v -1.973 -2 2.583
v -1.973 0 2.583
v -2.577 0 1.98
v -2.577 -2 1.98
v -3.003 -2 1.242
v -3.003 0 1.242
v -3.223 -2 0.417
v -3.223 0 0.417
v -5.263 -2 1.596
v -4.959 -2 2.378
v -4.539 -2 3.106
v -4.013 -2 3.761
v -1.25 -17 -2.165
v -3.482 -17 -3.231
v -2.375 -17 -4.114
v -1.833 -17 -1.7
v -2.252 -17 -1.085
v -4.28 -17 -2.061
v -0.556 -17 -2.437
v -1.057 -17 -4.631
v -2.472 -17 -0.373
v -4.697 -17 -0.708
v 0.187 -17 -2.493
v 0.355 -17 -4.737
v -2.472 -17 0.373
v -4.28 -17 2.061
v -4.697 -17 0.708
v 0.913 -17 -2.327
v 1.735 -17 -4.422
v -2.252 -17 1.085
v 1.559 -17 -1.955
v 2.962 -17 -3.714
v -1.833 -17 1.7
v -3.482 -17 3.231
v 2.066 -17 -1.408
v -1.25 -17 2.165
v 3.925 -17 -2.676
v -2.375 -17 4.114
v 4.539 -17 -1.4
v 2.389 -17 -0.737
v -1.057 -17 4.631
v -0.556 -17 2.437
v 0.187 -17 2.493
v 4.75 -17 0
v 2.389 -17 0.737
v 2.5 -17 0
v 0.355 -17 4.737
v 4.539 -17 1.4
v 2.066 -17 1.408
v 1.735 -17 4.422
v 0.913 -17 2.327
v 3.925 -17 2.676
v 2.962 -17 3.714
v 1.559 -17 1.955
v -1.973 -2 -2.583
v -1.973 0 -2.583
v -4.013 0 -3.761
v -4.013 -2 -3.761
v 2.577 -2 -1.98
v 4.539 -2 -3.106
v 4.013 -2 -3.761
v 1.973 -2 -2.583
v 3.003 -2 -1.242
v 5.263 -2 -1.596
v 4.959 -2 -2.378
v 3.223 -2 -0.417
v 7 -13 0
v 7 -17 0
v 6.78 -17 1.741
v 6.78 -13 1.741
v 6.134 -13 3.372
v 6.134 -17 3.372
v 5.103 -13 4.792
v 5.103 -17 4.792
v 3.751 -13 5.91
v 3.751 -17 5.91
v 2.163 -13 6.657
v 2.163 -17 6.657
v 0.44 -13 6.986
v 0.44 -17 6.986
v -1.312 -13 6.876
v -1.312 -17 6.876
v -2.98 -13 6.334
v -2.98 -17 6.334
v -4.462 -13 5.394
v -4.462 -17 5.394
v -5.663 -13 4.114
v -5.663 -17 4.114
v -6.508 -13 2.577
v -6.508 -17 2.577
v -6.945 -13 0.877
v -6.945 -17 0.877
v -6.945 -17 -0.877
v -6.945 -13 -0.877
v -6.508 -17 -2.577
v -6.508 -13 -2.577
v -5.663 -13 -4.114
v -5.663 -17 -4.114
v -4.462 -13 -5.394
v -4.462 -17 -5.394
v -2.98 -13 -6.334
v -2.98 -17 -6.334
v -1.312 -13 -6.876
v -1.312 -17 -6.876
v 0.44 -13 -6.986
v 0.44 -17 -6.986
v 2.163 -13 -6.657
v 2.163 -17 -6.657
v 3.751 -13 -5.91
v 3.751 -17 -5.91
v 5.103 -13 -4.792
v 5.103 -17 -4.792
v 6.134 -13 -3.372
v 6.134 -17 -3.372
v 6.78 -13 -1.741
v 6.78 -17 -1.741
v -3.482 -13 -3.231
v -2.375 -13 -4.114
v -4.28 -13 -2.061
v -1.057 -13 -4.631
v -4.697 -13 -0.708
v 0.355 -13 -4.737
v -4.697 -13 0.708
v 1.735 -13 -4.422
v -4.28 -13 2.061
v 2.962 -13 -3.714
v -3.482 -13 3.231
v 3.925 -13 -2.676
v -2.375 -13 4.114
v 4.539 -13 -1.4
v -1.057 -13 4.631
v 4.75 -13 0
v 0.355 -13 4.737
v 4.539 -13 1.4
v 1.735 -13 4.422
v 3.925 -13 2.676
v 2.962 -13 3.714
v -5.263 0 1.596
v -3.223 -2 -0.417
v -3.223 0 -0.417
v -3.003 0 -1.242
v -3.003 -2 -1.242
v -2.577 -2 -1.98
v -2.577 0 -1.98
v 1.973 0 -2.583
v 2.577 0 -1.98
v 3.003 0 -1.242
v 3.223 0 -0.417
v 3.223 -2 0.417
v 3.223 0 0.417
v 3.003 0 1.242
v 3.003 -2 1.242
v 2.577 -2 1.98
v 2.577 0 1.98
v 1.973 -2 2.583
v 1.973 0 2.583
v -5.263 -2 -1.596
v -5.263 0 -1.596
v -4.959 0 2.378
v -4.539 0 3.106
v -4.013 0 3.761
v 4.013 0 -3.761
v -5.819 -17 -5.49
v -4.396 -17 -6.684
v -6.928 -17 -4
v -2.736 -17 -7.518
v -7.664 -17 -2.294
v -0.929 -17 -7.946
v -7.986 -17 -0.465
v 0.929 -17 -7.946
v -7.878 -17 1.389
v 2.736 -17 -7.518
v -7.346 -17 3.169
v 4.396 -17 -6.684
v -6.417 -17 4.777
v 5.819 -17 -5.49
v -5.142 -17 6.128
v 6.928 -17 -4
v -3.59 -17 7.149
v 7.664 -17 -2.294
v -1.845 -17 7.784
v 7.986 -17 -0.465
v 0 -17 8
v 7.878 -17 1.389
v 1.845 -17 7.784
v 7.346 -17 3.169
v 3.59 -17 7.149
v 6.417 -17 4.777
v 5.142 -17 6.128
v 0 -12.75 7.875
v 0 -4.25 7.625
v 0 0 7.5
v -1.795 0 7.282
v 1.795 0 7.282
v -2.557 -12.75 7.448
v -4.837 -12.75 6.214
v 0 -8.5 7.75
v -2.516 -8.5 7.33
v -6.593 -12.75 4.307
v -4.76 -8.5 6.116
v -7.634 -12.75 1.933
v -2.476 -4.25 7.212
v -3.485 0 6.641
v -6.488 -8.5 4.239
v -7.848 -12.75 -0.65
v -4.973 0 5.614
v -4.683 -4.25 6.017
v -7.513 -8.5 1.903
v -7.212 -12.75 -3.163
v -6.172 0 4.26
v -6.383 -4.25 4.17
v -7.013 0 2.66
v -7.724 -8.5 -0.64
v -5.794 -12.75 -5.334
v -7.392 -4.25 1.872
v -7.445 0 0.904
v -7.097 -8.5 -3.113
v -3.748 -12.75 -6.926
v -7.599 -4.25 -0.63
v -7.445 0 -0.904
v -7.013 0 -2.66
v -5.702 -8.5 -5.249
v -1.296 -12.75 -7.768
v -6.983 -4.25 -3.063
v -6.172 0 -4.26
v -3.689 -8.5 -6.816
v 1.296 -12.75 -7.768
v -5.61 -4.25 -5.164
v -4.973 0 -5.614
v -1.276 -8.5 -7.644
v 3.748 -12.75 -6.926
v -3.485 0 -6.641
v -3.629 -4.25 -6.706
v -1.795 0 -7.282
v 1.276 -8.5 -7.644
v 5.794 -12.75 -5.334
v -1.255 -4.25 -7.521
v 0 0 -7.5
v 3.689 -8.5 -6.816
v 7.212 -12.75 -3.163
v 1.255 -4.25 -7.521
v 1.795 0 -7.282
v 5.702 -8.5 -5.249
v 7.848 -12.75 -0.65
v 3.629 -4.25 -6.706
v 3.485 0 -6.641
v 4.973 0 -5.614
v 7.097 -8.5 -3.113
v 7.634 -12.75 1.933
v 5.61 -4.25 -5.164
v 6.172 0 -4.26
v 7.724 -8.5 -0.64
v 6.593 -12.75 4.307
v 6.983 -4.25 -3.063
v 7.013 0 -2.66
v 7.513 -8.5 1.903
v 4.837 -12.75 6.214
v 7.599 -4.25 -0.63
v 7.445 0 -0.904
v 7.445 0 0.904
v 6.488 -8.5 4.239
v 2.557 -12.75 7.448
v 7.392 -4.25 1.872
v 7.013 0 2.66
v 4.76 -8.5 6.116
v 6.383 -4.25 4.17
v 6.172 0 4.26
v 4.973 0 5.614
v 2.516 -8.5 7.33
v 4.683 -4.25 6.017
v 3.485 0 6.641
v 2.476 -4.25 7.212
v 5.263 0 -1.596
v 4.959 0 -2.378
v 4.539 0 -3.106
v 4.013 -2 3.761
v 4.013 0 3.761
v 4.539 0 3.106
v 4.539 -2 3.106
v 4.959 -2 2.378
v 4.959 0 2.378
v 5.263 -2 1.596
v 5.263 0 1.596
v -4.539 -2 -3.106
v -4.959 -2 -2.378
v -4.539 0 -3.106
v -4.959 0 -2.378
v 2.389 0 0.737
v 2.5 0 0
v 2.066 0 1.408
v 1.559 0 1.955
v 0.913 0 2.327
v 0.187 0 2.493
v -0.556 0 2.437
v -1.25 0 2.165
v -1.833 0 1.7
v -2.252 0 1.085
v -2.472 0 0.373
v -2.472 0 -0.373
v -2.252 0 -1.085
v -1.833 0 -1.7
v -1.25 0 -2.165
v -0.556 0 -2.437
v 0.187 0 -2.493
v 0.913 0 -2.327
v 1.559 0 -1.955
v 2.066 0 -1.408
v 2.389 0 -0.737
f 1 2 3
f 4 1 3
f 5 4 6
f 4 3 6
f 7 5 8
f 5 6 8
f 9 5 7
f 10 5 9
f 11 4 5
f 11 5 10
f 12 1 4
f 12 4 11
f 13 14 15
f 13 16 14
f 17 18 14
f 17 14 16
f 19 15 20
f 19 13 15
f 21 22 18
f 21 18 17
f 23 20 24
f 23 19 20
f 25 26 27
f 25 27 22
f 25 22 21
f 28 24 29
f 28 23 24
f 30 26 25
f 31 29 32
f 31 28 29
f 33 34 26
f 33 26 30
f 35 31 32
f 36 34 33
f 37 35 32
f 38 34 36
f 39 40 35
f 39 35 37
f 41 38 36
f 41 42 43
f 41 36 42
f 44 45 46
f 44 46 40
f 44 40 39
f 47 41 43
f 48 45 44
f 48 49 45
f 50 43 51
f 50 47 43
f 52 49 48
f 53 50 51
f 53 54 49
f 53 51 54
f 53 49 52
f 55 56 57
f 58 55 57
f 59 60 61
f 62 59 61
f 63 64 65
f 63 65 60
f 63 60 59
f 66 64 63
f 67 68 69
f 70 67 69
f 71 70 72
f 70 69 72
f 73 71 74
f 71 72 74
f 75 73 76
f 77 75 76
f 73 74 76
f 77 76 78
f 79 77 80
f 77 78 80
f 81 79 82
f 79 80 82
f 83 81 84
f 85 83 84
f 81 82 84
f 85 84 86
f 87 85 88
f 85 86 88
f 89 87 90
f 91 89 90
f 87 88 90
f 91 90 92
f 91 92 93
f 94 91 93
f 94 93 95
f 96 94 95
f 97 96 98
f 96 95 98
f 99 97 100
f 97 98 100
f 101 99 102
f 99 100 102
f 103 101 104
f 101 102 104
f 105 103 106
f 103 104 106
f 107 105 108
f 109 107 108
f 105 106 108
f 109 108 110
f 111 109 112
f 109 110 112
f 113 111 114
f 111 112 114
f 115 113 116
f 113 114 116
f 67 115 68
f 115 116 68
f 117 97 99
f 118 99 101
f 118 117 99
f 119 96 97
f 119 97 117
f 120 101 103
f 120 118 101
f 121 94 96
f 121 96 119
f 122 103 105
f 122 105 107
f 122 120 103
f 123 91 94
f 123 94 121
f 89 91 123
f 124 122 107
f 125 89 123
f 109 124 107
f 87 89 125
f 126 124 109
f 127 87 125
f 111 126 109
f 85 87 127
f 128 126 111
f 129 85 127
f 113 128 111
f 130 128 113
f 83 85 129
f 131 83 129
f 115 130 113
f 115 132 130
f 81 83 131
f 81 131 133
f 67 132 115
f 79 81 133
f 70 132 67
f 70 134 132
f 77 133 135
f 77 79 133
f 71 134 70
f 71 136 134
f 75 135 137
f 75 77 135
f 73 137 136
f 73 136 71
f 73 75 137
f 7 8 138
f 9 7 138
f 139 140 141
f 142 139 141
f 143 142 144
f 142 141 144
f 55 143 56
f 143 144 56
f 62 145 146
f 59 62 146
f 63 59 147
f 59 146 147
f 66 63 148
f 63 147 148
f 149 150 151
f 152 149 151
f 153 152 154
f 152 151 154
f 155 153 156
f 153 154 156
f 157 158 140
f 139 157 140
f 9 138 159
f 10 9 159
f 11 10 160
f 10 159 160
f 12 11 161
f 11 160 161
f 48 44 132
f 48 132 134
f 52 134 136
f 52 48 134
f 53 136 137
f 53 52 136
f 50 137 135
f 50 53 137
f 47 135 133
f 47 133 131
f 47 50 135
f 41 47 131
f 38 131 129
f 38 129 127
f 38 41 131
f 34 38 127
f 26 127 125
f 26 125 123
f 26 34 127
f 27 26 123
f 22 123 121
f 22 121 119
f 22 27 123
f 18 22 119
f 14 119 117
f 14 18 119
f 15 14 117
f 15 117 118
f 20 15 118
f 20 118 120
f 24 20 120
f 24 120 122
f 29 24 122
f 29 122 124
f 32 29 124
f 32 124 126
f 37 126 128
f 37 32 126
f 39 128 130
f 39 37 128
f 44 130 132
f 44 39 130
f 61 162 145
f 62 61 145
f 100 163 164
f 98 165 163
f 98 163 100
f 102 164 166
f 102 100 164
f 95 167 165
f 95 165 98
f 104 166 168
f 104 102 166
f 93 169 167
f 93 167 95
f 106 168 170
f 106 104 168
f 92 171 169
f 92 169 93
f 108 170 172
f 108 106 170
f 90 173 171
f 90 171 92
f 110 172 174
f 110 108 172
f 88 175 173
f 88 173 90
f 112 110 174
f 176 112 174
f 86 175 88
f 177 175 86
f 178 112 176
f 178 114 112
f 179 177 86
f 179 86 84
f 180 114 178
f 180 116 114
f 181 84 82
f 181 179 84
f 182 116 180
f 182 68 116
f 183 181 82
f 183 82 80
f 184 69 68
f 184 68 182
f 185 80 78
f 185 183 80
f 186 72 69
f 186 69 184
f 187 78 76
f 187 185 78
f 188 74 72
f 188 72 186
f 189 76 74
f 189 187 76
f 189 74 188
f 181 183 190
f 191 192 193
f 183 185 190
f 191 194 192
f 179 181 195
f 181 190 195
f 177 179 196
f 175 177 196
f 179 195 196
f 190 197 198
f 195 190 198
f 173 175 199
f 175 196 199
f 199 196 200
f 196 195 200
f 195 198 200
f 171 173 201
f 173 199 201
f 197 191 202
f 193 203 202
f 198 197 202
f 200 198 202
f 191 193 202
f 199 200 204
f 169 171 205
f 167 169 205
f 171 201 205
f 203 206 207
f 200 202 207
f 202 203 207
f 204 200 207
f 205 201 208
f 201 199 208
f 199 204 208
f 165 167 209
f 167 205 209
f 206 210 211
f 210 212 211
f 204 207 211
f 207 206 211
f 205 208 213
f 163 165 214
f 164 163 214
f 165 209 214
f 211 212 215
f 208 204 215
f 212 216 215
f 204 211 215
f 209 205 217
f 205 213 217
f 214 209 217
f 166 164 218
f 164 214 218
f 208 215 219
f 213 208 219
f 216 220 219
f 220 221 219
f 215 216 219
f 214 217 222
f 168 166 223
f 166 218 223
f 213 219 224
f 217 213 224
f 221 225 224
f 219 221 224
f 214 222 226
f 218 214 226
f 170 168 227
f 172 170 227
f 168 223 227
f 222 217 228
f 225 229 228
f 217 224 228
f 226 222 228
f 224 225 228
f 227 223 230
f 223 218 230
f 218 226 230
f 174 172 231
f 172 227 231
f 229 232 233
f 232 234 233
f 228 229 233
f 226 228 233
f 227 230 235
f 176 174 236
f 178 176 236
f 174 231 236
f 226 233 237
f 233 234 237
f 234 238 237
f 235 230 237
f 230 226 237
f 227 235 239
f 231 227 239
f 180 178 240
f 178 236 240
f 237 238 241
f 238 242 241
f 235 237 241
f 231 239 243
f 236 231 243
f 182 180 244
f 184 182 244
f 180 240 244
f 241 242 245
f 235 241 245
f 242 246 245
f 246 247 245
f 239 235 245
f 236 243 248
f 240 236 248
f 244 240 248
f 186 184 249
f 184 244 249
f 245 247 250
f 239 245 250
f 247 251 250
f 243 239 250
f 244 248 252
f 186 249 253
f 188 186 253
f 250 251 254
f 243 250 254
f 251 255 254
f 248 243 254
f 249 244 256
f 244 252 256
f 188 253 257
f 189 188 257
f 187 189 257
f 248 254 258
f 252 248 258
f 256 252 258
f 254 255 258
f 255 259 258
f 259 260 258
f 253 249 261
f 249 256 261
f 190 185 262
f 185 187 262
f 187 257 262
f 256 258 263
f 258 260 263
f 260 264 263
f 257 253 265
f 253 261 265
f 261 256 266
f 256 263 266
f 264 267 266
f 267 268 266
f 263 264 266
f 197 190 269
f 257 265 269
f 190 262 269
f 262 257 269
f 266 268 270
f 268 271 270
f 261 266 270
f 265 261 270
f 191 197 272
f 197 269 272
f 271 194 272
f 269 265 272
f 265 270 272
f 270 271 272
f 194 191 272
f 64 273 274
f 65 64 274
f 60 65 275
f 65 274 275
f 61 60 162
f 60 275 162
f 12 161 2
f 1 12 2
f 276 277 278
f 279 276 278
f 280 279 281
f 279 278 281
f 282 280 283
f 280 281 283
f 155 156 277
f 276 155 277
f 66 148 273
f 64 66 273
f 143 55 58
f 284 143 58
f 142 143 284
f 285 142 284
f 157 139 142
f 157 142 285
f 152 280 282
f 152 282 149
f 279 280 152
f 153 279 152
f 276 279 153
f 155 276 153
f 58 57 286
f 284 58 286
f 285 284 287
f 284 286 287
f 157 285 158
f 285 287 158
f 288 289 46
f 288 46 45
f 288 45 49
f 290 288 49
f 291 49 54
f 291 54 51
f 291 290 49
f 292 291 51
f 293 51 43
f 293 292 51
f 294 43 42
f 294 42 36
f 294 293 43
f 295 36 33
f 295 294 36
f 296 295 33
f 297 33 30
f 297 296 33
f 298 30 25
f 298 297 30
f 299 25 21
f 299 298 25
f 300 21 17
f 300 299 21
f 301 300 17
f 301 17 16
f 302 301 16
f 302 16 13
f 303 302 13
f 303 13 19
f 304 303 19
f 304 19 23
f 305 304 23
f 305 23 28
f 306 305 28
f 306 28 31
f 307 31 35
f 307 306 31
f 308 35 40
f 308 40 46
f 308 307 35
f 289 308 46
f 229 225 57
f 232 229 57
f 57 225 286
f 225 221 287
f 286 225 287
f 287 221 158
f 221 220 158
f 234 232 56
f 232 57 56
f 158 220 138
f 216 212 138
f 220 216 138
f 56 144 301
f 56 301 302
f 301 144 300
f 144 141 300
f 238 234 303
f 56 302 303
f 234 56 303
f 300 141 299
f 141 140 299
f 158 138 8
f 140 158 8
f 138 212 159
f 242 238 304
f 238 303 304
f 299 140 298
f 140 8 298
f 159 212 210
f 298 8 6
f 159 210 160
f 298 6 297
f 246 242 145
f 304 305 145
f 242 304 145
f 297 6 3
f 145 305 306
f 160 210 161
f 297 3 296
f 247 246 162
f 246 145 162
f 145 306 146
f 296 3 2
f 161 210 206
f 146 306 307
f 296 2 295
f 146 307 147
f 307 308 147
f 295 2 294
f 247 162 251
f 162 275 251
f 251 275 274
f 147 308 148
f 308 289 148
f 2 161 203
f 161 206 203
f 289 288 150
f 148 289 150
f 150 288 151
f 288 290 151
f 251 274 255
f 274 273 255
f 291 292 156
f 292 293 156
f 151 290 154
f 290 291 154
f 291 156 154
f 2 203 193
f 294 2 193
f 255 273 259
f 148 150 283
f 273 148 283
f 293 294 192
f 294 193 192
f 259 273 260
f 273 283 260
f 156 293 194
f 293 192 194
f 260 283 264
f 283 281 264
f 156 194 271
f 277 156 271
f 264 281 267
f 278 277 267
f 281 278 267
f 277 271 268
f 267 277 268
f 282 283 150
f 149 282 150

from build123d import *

# Parameters (mm, degrees)
F0_R     = 8
F0_R_2   = 2.5
F1_DEPTH = 17
F2_R     = 7
F2_R_2   = 4.75
F3_DEPTH = 4
F5_DEPTH = 2


with BuildPart() as f1:
    # F0 (on Front) → F1 (new body)
    with BuildSketch(Plane.XZ):
        Circle(F0_R)
        Circle(F0_R_2, mode=Mode.SUBTRACT)
    extrude(amount=F1_DEPTH)

    # F2 (on face) → F3 (cut)
    with BuildSketch(Plane.XZ.offset(17)):
        Circle(F2_R)
        Circle(F2_R_2, mode=Mode.SUBTRACT)
    extrude(amount=-F3_DEPTH, mode=Mode.SUBTRACT)

    # F4 (on face) → F5 (cut)
    with BuildSketch(Plane(origin=(0, 0, 0), x_dir=(-1, 0, 0), z_dir=(0, 1, 0))):
        with BuildLine():
            ThreePointArc((-3.223076, 0.417468), (-2.814583, 1.625), (-1.973076, 2.582532))
            Line((-1.973076, 2.582532), (-4.013494, 3.760567))
            ThreePointArc((-4.013494, 3.760567), (-4.76314, 2.75), (-5.263494, 1.595504))
            Line((-5.263494, 1.595504), (-3.223076, 0.417468))
        make_face()
        with BuildLine():
            Line((-3.223076, -0.417468), (-5.263494, -1.595504))
            ThreePointArc((-5.263494, -1.595504), (-4.76314, -2.75), (-4.013494, -3.760567))
            Line((-4.013494, -3.760567), (-1.973076, -2.582532))
            ThreePointArc((-1.973076, -2.582532), (-2.814583, -1.625), (-3.223076, -0.417468))
        make_face()
        with BuildLine():
            Line((1.973076, -2.582532), (4.013494, -3.760567))
            ThreePointArc((4.013494, -3.760567), (4.76314, -2.75), (5.263494, -1.595504))
            Line((5.263494, -1.595504), (3.223076, -0.417468))
            ThreePointArc((3.223076, -0.417468), (2.814583, -1.625), (1.973076, -2.582532))
        make_face()
        with BuildLine():
            Line((3.223076, 0.417468), (5.263494, 1.595504))
            ThreePointArc((5.263494, 1.595504), (4.76314, 2.75), (4.013494, 3.760567))
            Line((4.013494, 3.760567), (1.973076, 2.582532))
            ThreePointArc((1.973076, 2.582532), (2.814583, 1.625), (3.223076, 0.417468))
        make_face()
    extrude(amount=-F5_DEPTH, mode=Mode.SUBTRACT)

    # F6 (on Right) → F7 (revolve, cut)
    with BuildSketch(Plane.YZ):
        Polygon((0, 8), (-17, 8), (0, 7.5), align=None)
    revolve(axis=Axis((0, -3.680971, 0), (0, -1, 0)), mode=Mode.SUBTRACT)


solid = f1.part
